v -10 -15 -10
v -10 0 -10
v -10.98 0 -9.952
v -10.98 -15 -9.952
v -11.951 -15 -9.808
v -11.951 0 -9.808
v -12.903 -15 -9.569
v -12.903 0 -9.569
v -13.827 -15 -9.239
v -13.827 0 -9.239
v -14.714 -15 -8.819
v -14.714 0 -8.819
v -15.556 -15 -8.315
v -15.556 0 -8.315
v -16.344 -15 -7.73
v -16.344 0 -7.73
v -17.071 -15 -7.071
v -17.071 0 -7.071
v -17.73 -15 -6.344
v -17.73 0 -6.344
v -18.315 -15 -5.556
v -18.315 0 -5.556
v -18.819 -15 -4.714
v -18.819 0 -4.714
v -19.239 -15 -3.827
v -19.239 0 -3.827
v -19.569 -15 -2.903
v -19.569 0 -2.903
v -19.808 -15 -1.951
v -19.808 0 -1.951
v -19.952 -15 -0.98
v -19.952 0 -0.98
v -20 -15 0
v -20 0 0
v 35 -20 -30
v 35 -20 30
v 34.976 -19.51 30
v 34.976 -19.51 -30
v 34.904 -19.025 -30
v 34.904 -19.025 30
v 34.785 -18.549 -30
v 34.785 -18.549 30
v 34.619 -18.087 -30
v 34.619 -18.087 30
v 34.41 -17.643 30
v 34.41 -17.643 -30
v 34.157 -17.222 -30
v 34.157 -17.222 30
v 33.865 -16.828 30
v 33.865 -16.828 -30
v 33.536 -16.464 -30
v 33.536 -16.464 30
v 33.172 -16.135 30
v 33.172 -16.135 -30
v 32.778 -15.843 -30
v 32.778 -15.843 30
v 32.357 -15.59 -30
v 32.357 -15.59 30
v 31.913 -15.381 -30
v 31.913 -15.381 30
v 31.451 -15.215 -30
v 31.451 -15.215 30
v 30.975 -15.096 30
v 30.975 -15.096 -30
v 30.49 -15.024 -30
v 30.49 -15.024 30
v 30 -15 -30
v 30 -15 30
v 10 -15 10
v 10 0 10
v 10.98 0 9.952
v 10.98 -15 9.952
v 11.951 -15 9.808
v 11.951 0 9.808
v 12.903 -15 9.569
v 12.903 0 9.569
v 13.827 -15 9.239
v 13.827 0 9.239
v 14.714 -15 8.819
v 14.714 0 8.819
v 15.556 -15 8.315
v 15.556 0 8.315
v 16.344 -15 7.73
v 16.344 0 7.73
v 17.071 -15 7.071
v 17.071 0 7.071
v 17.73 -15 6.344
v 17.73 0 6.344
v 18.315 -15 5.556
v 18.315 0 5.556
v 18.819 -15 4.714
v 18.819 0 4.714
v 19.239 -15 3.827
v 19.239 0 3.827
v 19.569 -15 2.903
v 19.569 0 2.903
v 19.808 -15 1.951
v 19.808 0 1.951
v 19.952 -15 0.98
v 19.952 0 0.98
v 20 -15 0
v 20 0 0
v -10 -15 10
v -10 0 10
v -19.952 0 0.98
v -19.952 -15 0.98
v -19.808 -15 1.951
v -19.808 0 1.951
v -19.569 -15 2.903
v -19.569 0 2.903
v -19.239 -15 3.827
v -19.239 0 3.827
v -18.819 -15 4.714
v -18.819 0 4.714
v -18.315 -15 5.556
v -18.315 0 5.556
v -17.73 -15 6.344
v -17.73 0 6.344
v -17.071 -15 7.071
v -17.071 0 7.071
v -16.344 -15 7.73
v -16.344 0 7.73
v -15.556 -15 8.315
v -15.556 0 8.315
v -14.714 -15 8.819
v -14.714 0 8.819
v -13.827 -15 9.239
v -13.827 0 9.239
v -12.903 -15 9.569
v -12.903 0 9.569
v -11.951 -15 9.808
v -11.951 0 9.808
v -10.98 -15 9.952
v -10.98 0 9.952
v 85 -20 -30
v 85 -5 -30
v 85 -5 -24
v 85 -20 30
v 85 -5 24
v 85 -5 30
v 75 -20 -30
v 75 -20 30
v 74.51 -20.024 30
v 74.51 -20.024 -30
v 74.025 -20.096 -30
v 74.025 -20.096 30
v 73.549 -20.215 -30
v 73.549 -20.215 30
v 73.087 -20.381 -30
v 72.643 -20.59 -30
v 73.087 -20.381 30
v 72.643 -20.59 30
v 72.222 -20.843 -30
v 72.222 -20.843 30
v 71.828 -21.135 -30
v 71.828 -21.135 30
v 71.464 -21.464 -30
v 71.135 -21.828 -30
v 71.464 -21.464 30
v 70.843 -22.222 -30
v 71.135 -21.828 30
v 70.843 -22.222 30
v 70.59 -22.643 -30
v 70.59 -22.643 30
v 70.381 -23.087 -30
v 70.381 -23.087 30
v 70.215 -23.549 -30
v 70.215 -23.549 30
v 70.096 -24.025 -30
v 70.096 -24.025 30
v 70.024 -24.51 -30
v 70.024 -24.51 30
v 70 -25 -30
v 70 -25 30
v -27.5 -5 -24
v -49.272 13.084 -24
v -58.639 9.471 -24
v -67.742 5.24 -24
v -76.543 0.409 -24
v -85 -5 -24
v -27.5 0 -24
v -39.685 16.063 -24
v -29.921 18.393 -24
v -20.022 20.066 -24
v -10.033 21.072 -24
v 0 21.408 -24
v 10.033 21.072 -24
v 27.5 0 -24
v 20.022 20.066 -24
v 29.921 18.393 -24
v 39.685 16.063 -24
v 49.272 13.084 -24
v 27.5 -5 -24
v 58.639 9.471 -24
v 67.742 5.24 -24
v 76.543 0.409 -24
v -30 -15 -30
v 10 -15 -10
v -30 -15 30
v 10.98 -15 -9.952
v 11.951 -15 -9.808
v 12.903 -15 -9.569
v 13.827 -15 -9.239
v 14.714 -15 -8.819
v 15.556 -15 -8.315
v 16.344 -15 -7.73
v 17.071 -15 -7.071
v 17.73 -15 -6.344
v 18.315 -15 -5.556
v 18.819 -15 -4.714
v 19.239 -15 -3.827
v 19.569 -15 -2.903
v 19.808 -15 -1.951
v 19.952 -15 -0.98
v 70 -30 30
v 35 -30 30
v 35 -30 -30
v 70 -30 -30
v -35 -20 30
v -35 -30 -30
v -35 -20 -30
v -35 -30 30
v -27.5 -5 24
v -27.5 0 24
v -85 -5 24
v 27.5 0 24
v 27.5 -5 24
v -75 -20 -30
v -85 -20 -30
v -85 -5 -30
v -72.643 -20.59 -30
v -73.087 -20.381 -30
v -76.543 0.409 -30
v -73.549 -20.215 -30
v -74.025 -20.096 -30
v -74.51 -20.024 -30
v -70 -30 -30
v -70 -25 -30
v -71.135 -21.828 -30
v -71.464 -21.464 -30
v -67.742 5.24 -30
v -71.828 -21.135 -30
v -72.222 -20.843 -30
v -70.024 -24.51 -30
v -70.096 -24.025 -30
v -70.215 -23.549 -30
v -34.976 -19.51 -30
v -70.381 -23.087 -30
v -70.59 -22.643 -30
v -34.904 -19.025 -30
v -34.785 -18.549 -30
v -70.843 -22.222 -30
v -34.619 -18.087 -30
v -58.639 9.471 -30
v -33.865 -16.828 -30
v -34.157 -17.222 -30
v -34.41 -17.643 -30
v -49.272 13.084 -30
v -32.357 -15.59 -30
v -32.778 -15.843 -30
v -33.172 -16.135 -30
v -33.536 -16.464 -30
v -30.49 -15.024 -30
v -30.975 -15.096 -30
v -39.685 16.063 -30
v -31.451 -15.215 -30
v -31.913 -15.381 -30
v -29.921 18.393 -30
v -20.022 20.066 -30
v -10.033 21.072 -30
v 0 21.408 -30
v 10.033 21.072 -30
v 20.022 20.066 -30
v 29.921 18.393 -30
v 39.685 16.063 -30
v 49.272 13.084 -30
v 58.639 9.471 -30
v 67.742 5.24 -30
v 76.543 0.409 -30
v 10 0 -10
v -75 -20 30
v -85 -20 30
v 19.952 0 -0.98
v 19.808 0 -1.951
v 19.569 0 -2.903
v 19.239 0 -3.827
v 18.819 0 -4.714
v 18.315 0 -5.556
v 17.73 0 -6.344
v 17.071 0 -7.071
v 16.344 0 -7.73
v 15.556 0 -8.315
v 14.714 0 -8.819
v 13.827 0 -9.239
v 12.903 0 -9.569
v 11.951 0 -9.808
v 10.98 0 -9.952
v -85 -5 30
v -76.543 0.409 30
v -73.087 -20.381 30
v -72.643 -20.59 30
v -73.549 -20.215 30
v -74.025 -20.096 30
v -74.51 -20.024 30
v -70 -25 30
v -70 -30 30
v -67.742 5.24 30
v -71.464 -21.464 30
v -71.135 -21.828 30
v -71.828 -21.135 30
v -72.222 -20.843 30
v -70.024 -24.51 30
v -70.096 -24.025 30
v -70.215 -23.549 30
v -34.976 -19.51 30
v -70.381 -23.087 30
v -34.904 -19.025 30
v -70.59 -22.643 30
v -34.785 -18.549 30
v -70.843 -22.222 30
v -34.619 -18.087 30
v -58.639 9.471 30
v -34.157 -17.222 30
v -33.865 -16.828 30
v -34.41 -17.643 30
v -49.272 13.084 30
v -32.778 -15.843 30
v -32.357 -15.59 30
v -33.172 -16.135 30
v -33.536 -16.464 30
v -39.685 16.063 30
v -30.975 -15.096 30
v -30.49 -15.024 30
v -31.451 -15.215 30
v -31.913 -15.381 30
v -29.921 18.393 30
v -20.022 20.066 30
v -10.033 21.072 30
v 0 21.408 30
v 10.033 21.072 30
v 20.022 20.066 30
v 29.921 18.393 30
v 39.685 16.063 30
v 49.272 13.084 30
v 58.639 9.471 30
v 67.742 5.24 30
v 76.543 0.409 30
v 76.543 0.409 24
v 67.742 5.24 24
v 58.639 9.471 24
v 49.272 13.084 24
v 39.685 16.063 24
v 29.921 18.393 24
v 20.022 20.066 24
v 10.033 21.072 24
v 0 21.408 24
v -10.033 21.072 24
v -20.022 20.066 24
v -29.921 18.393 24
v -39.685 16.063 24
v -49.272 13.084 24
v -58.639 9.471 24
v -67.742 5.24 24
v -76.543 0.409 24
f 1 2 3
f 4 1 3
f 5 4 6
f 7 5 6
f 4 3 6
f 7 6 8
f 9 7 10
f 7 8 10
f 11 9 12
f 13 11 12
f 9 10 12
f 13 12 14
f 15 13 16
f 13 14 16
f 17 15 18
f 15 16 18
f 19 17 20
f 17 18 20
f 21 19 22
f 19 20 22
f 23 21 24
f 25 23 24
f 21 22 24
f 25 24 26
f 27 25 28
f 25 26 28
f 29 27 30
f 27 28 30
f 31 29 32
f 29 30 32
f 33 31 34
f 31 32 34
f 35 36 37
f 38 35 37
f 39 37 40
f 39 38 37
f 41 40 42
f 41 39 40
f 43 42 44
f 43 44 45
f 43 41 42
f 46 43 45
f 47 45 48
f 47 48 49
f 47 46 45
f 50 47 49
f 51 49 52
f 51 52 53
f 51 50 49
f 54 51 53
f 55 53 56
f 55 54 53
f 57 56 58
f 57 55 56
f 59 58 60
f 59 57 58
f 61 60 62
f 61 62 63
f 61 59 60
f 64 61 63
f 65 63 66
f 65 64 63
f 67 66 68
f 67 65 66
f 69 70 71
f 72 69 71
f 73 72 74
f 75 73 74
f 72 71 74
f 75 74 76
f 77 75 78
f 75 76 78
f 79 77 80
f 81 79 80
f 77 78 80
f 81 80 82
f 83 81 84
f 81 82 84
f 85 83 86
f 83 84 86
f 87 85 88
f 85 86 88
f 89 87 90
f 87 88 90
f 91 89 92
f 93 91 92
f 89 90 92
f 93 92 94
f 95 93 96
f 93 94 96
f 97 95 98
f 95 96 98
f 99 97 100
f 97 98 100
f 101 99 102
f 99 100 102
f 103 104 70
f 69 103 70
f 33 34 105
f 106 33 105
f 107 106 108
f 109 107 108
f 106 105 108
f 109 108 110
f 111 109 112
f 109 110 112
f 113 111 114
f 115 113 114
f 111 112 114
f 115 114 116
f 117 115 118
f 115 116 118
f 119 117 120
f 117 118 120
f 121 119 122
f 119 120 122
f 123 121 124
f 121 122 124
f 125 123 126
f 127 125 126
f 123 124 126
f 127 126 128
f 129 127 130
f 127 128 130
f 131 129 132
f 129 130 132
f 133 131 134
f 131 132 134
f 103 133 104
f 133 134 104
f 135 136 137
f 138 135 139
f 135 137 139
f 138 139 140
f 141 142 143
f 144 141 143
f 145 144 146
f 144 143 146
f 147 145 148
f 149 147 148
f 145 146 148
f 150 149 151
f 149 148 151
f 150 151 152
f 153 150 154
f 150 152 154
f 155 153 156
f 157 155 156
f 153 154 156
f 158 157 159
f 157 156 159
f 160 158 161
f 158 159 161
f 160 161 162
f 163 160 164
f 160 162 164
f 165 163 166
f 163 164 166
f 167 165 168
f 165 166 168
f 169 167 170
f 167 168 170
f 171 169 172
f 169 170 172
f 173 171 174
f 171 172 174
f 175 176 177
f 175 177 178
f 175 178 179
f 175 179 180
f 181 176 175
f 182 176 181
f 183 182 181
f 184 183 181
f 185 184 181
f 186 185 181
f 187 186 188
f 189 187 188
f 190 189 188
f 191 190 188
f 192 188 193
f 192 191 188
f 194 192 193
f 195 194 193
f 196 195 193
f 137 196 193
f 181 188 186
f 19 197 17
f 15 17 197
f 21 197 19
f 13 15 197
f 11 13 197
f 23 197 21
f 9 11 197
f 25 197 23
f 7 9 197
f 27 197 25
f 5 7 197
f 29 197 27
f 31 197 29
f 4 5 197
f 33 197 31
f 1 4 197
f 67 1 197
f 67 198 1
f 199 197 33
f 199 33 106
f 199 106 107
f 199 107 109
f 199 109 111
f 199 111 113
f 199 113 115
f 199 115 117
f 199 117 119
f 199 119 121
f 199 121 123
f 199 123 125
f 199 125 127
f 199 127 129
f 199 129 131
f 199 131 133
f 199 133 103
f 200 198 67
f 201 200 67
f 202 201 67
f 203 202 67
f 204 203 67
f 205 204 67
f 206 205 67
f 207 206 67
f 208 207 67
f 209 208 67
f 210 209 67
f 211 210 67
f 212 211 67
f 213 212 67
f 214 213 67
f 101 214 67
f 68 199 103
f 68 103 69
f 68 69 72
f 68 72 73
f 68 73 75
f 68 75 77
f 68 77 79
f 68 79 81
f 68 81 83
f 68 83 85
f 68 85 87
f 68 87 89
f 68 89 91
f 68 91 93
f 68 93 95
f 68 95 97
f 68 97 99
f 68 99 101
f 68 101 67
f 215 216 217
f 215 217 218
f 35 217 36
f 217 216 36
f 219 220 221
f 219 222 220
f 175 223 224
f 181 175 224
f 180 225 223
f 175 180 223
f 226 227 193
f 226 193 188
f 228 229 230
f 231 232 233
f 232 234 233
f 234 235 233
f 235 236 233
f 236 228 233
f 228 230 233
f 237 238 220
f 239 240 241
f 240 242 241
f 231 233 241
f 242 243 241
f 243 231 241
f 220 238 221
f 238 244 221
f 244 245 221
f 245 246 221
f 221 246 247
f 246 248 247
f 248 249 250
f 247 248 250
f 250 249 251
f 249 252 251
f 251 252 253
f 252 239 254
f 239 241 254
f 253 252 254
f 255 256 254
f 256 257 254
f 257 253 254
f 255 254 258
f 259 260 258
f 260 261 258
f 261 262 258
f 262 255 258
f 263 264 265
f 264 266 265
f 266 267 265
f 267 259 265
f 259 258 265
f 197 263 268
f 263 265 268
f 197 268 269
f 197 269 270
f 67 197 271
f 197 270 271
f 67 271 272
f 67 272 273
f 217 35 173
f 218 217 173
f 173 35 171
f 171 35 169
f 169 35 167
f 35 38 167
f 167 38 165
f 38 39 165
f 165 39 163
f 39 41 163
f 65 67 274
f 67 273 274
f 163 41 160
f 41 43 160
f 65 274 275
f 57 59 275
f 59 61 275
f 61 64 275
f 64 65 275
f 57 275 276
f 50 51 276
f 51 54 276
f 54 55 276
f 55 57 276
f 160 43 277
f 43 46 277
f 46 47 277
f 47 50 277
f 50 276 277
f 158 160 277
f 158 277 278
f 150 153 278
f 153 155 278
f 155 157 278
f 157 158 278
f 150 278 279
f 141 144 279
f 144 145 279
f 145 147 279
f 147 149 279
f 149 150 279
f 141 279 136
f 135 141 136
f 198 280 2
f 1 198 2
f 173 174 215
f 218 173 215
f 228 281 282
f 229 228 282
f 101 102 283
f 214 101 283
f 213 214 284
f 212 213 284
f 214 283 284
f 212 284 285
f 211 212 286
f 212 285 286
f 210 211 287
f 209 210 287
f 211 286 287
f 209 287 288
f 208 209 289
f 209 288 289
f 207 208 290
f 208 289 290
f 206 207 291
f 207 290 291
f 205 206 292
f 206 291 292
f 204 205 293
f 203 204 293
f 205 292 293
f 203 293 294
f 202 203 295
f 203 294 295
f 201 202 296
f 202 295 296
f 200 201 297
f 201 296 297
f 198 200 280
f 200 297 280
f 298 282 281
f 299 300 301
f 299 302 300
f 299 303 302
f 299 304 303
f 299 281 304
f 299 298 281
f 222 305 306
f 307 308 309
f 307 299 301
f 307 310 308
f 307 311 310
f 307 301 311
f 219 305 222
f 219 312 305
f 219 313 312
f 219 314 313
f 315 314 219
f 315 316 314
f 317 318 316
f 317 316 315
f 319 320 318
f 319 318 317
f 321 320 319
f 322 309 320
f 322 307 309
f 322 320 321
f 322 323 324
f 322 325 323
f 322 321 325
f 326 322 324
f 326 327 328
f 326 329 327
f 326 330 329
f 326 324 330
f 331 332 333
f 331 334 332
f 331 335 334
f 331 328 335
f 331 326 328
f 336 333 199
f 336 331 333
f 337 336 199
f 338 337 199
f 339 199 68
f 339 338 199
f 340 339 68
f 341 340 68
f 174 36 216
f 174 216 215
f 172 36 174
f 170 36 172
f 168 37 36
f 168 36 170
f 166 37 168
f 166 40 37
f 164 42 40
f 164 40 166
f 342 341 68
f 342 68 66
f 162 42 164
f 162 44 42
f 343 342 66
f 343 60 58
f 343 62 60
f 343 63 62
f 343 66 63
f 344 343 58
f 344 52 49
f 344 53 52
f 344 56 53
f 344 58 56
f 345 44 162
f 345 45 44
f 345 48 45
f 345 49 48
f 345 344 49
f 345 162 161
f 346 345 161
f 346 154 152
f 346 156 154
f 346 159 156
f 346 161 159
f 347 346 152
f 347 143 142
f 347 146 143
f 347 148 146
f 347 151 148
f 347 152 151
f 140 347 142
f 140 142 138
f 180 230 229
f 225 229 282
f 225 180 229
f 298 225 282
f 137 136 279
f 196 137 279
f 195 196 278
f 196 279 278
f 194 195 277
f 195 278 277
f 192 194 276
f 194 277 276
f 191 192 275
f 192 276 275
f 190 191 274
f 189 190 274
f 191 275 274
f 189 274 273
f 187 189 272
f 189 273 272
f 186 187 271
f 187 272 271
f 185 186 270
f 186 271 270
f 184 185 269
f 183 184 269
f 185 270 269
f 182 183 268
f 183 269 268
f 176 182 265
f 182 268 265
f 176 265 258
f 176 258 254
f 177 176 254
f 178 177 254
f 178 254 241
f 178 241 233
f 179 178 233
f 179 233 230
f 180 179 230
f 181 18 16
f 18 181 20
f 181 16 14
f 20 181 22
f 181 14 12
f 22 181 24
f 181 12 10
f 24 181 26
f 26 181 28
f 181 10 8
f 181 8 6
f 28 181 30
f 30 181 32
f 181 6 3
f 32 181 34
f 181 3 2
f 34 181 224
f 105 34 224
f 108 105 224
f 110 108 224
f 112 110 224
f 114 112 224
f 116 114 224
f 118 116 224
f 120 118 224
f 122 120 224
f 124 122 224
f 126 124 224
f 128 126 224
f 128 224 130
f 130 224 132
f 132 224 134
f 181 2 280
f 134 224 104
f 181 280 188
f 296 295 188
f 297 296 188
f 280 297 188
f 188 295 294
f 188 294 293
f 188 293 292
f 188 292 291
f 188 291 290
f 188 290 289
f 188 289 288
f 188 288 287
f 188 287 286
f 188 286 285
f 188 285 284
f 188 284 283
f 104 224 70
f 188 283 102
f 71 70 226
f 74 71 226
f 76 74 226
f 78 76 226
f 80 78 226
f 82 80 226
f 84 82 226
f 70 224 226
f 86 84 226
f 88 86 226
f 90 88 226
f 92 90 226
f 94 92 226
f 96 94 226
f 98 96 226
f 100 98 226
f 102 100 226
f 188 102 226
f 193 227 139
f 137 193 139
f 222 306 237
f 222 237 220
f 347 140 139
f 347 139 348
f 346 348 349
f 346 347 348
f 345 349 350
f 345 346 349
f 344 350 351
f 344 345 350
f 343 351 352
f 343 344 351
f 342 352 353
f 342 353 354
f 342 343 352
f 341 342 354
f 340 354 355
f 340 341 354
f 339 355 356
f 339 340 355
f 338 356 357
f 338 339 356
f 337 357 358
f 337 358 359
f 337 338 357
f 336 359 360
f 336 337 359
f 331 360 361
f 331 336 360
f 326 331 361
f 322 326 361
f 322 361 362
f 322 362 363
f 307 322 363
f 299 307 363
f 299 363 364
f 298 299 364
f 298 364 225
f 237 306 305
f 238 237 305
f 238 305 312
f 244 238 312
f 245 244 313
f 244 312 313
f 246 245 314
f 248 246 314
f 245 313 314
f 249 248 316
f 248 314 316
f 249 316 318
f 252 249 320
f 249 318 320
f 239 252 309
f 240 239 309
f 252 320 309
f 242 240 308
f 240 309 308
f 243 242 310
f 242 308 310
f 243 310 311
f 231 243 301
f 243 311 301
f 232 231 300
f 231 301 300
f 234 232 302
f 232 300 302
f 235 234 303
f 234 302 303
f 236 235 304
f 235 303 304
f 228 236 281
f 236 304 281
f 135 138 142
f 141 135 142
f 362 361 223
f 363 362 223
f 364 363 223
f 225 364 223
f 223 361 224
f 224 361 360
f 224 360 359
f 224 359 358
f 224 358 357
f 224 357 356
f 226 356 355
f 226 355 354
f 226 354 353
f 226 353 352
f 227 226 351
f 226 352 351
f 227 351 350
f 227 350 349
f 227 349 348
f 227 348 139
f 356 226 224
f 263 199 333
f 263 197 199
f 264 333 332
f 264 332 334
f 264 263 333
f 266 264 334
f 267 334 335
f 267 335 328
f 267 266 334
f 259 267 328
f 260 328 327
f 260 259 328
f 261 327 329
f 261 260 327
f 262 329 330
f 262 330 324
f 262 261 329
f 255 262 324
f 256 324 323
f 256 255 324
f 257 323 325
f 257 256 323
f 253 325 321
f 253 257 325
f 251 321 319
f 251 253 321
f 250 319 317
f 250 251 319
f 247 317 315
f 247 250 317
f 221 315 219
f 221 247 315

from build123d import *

# Parameters (mm, degrees)
F0_W      = 170
F0_H      = 60
F1_DEPTH  = 30
F2_W      = 70
F2_H      = 30
F3_DEPTH  = 59.69157
F4_R      = 5
F6_DEPTH  = 60.001
F7_W      = 57.5
F7_H      = 5
F8_DEPTH  = 60.001
F10_DEPTH = 6
F13_DEPTH = 30.001


with BuildPart() as f1:
    # F0 (on Front) → F1 (new body)
    with BuildSketch(Plane.XZ):
        Rectangle(F0_W, F0_H)
    extrude(amount=F1_DEPTH)

    # F2 (on Top) → F3 (cut, symmetric)
    with BuildSketch(Plane.XY):
        with Locations((0, -30)):
            Rectangle(F2_W, F2_H)
    extrude(amount=F3_DEPTH, both=True, mode=Mode.SUBTRACT)

    # F4
    f4_edges = [f1.edges().sort_by_distance(p)[0] for p in [
        (35, -15, 0),
        (-35, -15, 0),
    ]]
    fillet(f4_edges, radius=F4_R)

    # F5 (on face) → F6 (cut, through all)
    with BuildSketch(Plane.XY.offset(30)):
        with BuildLine():
            Line((70, -30), (85, -30))
            Line((85, -30), (85, -20))
            Line((85, -20), (75, -20))
            ThreePointArc((75, -20), (71.4644660941, -21.4644660941), (70, -25))
            Line((70, -25), (70, -30))
        make_face()
        with BuildLine():
            Line((-85, -20), (-85, -30))
            Line((-85, -30), (-70, -30))
            Line((-70, -30), (-70, -25))
            ThreePointArc((-70, -25), (-71.4644660941, -21.4644660941), (-75, -20))
            Line((-75, -20), (-85, -20))
        make_face()
    extrude(amount=-F6_DEPTH, mode=Mode.SUBTRACT)

    # F7 (on face) → F8 (cut, through all)
    with BuildSketch(Plane.XY.offset(30)):
        with Locations((56.25, -2.5)):
            Rectangle(F7_W, F7_H)
        with Locations((-56.25, -2.5)):
            Rectangle(F7_W, F7_H)
    extrude(amount=-F8_DEPTH, mode=Mode.SUBTRACT)

    # F9 (on face) → F10 (join)
    with BuildSketch(Plane.XY.offset(30)):
        with BuildLine():
            Line((27.5, -5), (85, -5))
            ThreePointArc((85, -5), (0, 21.4079290569), (-85, -5))
            Line((-85, -5), (-27.5, -5))
            Line((-27.5, -5), (-27.5, 0))
            Line((-27.5, 0), (27.5, 0))
            Line((27.5, 0), (27.5, -5))
        make_face()
    extrude(amount=-F10_DEPTH)

    # F11: F1 across plane


with BuildPart() as f1_1:
    add(f1.part)
    add(f1.part.mirror(Plane.XY))

    # F12 (on face) → F13 (cut, through all)
    with BuildSketch(Plane(origin=(0, 0, 0), x_dir=(-1, 0, 0), z_dir=(0, 1, 0))):
        with BuildLine():
            ThreePointArc((20, 0), (17.0710678119, 7.0710678119), (10, 10))
            Line((10, 10), (-10, 10))
            ThreePointArc((-10, 10), (-17.0710678119, 7.0710678119), (-20, 0))
            ThreePointArc((-20, 0), (-17.0710678119, -7.0710678119), (-10, -10))
            Line((-10, -10), (10, -10))
            ThreePointArc((10, -10), (17.0710678119, -7.0710678119), (20, 0))
        make_face()
    extrude(amount=-F13_DEPTH, mode=Mode.SUBTRACT)


solid = f1_1.part
